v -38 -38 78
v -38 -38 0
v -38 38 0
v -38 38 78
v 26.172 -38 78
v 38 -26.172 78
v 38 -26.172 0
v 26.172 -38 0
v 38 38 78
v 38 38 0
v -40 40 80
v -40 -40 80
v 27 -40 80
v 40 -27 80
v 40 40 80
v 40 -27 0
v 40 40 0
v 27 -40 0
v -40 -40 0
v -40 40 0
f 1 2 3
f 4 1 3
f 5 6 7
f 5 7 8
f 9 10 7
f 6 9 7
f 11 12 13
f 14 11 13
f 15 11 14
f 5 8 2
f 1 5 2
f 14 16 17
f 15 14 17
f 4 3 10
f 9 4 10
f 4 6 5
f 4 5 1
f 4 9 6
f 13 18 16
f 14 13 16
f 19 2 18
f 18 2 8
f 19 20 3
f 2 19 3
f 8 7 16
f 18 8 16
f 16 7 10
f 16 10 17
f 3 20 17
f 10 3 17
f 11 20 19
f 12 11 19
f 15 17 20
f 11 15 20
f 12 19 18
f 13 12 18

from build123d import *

# Parameters (mm, degrees)
BOSS_EXTRU_1_DEPTH      = 80
ENL_V_MAT_EXTRU_1_DEPTH = 78


with BuildPart() as part:
    # Esquisse1 → Boss.-Extru.1 (new body)
    with BuildSketch(Plane.XY):
        Polygon((27, -40), (40, -27), (40, 40), (-40, 40), (-40, -40), align=None)
    extrude(amount=BOSS_EXTRU_1_DEPTH)

    # Esquisse2 → Enlèv. mat.-Extru.1 (cut)
    with BuildSketch(Plane(origin=(0, 0, 0), x_dir=(-1, 0, 0), z_dir=(0, 0, -1))):
        Polygon((-38, -26.171572875), (-26.171572875, -38), (38, -38), (38, 38), (-38, 38), align=None)
    extrude(amount=-ENL_V_MAT_EXTRU_1_DEPTH, mode=Mode.SUBTRACT)


solid = part.part
